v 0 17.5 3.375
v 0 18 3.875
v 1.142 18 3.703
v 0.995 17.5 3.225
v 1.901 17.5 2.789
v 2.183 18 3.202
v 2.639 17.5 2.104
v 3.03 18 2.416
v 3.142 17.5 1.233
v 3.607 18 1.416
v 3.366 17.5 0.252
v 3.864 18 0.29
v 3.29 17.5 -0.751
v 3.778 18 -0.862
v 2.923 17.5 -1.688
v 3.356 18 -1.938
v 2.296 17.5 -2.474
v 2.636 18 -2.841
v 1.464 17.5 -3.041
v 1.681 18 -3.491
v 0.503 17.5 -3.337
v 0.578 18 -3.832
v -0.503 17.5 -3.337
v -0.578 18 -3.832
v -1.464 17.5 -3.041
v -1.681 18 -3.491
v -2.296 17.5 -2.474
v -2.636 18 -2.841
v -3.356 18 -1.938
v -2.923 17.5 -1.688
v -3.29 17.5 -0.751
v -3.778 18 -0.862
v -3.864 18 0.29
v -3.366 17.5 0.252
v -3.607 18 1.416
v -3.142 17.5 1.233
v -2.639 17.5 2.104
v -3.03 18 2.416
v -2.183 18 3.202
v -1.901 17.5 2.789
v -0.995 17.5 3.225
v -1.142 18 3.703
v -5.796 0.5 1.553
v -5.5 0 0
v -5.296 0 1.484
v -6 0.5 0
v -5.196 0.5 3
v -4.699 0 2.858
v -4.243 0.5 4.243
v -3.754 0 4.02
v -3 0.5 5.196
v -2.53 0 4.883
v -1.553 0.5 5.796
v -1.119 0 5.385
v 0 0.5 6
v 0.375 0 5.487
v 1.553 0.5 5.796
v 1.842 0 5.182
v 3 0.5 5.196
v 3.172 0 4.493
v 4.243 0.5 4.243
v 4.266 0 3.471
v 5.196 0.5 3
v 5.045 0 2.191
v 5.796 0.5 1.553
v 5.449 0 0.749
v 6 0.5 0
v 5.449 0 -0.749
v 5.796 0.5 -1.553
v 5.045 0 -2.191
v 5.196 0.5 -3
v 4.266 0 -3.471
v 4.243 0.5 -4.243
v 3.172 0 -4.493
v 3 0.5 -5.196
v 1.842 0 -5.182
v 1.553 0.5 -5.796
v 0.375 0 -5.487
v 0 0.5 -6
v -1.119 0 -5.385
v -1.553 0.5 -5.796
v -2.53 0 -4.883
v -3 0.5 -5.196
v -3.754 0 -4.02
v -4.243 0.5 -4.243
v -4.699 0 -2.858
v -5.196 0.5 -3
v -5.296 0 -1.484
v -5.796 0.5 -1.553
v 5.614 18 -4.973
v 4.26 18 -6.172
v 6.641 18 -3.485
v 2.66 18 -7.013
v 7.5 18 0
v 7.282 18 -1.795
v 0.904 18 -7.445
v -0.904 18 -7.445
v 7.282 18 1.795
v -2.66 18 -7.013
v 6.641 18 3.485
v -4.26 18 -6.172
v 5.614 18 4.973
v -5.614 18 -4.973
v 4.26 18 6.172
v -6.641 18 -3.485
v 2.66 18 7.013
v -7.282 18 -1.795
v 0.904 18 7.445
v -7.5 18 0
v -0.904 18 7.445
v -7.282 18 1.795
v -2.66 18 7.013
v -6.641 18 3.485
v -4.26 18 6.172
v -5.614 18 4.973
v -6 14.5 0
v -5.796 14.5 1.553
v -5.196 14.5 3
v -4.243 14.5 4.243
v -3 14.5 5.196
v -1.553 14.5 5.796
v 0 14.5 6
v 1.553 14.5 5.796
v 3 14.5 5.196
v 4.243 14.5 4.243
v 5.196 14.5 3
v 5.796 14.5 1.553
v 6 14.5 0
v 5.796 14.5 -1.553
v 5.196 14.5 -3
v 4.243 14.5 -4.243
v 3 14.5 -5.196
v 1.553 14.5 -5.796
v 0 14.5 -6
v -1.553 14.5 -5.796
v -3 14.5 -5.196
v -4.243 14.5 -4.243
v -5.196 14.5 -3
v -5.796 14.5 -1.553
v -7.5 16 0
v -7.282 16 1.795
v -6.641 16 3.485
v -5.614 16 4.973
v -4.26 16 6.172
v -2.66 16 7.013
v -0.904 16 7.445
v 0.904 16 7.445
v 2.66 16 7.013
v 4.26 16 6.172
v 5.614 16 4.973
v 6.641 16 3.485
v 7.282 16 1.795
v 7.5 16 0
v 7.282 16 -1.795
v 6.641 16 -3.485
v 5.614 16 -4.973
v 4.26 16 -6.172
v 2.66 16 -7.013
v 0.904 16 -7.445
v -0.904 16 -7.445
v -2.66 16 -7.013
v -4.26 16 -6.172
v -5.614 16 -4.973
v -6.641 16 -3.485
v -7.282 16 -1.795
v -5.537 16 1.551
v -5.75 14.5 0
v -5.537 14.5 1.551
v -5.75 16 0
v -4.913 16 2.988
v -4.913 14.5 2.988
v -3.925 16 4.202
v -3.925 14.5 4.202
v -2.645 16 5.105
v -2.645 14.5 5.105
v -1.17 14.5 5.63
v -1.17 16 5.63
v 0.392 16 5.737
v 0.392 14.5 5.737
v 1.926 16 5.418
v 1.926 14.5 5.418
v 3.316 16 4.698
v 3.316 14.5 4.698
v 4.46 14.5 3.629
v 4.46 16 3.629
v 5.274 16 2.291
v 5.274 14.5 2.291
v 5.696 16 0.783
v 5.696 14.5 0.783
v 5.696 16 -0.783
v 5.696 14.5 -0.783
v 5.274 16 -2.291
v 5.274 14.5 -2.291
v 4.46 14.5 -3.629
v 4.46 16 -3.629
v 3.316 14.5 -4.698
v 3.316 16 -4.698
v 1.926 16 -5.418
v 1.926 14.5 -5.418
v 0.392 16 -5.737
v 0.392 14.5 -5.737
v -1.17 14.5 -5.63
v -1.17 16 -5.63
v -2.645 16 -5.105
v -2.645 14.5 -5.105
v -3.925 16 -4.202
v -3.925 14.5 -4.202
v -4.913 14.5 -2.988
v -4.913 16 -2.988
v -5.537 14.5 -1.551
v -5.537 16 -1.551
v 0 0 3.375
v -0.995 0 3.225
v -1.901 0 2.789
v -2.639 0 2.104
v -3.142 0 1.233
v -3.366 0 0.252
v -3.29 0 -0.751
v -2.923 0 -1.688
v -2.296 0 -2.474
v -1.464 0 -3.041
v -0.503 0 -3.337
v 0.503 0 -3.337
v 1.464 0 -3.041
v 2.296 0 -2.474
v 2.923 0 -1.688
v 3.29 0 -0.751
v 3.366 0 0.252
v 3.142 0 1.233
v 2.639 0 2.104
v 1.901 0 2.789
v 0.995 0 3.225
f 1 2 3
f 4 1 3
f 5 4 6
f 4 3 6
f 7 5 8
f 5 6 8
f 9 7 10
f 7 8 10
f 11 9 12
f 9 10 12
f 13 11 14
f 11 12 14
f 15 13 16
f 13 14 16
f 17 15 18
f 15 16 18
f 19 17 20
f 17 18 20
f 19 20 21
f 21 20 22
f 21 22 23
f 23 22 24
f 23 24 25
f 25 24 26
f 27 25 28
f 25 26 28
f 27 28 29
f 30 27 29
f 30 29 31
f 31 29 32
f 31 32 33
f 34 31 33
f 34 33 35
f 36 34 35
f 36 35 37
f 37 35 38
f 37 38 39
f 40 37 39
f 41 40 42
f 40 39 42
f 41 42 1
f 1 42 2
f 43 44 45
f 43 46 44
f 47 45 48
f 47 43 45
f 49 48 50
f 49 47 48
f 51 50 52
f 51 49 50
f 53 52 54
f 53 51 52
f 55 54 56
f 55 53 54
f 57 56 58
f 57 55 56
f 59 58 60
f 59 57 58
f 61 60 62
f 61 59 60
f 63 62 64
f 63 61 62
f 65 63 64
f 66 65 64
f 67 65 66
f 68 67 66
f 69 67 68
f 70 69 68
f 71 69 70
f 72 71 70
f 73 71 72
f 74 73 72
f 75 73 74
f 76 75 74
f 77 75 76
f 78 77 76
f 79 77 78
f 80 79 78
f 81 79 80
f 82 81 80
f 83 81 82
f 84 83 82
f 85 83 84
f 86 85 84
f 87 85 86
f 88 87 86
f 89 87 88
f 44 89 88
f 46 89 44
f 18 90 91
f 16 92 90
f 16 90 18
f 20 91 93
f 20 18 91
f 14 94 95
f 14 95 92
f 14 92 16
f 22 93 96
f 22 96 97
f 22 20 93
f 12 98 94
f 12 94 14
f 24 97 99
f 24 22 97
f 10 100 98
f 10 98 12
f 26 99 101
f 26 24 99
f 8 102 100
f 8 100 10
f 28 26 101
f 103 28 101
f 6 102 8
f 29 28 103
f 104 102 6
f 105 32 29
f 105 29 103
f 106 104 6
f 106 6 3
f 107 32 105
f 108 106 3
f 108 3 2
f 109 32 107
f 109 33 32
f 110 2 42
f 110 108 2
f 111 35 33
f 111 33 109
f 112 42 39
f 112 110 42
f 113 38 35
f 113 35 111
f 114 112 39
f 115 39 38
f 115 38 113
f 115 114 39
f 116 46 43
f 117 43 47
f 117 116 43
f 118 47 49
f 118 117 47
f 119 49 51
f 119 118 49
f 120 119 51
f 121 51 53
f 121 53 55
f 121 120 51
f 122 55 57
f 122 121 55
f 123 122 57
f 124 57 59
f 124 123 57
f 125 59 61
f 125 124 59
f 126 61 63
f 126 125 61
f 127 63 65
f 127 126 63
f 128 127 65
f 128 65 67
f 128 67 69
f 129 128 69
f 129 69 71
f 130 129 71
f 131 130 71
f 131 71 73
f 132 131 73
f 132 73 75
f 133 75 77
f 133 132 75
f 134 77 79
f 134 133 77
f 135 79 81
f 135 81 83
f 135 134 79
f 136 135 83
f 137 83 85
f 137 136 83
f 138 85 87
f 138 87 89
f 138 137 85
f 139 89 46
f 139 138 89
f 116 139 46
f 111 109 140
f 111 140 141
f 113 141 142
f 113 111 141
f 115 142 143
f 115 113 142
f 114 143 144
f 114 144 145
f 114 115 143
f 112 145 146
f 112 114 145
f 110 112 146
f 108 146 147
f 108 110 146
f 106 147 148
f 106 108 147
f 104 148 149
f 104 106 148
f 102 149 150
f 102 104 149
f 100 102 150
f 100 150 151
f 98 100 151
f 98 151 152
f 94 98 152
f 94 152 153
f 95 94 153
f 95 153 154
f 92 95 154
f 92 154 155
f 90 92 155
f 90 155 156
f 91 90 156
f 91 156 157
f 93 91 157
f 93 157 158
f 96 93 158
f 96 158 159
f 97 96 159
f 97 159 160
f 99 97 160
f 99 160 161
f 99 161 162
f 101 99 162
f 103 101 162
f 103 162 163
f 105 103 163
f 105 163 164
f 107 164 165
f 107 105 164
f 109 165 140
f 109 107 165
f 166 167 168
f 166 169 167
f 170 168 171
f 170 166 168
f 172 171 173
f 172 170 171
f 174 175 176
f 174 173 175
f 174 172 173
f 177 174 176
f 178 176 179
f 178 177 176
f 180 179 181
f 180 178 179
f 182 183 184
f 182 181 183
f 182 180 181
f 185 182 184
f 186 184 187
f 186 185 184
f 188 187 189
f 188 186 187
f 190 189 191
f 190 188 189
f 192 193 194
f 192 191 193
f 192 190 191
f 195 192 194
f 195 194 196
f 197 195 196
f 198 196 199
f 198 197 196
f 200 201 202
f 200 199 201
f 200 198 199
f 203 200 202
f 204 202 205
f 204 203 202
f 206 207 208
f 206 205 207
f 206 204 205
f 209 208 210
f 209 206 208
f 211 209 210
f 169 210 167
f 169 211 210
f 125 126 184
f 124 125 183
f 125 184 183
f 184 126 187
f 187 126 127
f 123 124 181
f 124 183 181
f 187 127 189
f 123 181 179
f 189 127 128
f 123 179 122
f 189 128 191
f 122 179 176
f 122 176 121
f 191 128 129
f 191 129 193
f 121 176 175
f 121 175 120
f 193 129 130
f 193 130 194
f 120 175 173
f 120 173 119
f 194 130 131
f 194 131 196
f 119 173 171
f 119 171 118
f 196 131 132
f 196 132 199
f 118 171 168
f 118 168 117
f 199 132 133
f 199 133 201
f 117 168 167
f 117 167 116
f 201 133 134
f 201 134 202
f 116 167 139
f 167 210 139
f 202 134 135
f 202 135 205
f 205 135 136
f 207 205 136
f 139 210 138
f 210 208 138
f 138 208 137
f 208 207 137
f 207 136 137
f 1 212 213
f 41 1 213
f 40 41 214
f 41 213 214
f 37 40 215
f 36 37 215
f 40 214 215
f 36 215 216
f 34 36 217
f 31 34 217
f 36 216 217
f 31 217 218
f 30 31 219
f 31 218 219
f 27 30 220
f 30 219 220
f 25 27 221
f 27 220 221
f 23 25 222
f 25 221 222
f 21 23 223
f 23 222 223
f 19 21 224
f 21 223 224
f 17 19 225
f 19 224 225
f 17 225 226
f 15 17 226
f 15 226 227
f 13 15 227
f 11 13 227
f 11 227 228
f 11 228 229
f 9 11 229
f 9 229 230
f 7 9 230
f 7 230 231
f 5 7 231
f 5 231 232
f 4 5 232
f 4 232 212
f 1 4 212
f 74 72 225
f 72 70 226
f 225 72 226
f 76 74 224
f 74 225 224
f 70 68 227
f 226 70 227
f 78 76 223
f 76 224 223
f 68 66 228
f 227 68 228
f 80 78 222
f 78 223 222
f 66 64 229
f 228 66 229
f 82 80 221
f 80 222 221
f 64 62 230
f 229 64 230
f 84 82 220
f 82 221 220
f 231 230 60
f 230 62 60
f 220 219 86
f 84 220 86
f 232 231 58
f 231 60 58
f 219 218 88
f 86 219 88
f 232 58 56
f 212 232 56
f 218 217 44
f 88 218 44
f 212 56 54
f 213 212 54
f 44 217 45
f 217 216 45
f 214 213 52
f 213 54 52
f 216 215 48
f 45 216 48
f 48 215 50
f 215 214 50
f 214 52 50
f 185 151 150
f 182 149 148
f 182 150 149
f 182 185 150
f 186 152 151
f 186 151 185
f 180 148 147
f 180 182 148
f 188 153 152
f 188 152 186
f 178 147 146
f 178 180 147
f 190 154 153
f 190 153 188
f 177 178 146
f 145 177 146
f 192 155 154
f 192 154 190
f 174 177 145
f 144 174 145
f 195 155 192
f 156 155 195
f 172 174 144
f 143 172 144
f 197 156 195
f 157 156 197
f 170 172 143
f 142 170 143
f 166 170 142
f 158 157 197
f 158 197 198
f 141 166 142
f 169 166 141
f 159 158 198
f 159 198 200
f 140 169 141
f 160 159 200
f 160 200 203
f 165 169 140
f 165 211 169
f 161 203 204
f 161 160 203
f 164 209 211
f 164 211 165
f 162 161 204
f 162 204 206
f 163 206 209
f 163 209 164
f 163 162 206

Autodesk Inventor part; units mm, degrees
ref_plane "YZ Plane" through (0, 0, 0) normal (1, 0, 0) x (0, 1, 0)
ref_plane "XZ Plane" through (0, 0, 0) normal (0, 1, 0) x (-1, 0, 0)
ref_plane "XY Plane" through (0, 0, 0) normal (0, 0, 1) x (1, 0, 0)
sketch "Sketch1" plane through (0, 0, 0) normal (0, 0, 1) x (1, 0, 0)
  line L0 (0, 0) -> (0, 18)
  line L1 (0, 0) -> (-6, 0)
  line L2 (-6, 0) -> (-6, 16)
  line L3 (-6, 16) -> (-7.5, 16)
  line L4 (-7.5, 16) -> (-7.5, 18)
  line L5 (-7.5, 18) -> (0, 18)
  dimension "d0" = 18
  dimension "d1" = 15
  dimension "d2" = 12
  dimension "d3" = 2
revolve "Revolution1" add sketch "Sketch1" angle 360 about axis through (0, 0, 0) along (0, 1, 0)
sketch "Sketch2" plane through (0, 0, 0) normal (0, 0, 1) x (1, 0, 0)
  line L0 (7.5, 16) -> (-7.5, 16) projected
  line L1 (-6, 0) -> (-6, 16) projected
  line L2 (-6, 14.5) -> (-5.75, 14.5)
  line L3 (-5.75, 14.5) -> (-5.75, 16)
  line L4 (0, 16) -> (0, 9.2067)
  point P0 (0, 0)
  dimension "d5" = 11.5
  dimension "d6" = 1.5
revolve "Revolution2" cut sketch "Sketch2" angle 360 about axis through (0, 16, 0) along (0, -1, 0)
sketch "Sketch3" plane through (0, 18, 0) normal (0, 1, 0) x (1, 0, 0)
  circle A0 centre (0, 0) radius 7.5 projected
hole "d6.75" at (0, 18, 0) direction (0, -1, 0) diameter 6.75 end through all
chamfer "0.5x45" distance 0.5 angle 45 2 edges at (0, 18, -3.375) (6, 0, 0)
properties part number "s14-13" material "Steel, Carbon"
